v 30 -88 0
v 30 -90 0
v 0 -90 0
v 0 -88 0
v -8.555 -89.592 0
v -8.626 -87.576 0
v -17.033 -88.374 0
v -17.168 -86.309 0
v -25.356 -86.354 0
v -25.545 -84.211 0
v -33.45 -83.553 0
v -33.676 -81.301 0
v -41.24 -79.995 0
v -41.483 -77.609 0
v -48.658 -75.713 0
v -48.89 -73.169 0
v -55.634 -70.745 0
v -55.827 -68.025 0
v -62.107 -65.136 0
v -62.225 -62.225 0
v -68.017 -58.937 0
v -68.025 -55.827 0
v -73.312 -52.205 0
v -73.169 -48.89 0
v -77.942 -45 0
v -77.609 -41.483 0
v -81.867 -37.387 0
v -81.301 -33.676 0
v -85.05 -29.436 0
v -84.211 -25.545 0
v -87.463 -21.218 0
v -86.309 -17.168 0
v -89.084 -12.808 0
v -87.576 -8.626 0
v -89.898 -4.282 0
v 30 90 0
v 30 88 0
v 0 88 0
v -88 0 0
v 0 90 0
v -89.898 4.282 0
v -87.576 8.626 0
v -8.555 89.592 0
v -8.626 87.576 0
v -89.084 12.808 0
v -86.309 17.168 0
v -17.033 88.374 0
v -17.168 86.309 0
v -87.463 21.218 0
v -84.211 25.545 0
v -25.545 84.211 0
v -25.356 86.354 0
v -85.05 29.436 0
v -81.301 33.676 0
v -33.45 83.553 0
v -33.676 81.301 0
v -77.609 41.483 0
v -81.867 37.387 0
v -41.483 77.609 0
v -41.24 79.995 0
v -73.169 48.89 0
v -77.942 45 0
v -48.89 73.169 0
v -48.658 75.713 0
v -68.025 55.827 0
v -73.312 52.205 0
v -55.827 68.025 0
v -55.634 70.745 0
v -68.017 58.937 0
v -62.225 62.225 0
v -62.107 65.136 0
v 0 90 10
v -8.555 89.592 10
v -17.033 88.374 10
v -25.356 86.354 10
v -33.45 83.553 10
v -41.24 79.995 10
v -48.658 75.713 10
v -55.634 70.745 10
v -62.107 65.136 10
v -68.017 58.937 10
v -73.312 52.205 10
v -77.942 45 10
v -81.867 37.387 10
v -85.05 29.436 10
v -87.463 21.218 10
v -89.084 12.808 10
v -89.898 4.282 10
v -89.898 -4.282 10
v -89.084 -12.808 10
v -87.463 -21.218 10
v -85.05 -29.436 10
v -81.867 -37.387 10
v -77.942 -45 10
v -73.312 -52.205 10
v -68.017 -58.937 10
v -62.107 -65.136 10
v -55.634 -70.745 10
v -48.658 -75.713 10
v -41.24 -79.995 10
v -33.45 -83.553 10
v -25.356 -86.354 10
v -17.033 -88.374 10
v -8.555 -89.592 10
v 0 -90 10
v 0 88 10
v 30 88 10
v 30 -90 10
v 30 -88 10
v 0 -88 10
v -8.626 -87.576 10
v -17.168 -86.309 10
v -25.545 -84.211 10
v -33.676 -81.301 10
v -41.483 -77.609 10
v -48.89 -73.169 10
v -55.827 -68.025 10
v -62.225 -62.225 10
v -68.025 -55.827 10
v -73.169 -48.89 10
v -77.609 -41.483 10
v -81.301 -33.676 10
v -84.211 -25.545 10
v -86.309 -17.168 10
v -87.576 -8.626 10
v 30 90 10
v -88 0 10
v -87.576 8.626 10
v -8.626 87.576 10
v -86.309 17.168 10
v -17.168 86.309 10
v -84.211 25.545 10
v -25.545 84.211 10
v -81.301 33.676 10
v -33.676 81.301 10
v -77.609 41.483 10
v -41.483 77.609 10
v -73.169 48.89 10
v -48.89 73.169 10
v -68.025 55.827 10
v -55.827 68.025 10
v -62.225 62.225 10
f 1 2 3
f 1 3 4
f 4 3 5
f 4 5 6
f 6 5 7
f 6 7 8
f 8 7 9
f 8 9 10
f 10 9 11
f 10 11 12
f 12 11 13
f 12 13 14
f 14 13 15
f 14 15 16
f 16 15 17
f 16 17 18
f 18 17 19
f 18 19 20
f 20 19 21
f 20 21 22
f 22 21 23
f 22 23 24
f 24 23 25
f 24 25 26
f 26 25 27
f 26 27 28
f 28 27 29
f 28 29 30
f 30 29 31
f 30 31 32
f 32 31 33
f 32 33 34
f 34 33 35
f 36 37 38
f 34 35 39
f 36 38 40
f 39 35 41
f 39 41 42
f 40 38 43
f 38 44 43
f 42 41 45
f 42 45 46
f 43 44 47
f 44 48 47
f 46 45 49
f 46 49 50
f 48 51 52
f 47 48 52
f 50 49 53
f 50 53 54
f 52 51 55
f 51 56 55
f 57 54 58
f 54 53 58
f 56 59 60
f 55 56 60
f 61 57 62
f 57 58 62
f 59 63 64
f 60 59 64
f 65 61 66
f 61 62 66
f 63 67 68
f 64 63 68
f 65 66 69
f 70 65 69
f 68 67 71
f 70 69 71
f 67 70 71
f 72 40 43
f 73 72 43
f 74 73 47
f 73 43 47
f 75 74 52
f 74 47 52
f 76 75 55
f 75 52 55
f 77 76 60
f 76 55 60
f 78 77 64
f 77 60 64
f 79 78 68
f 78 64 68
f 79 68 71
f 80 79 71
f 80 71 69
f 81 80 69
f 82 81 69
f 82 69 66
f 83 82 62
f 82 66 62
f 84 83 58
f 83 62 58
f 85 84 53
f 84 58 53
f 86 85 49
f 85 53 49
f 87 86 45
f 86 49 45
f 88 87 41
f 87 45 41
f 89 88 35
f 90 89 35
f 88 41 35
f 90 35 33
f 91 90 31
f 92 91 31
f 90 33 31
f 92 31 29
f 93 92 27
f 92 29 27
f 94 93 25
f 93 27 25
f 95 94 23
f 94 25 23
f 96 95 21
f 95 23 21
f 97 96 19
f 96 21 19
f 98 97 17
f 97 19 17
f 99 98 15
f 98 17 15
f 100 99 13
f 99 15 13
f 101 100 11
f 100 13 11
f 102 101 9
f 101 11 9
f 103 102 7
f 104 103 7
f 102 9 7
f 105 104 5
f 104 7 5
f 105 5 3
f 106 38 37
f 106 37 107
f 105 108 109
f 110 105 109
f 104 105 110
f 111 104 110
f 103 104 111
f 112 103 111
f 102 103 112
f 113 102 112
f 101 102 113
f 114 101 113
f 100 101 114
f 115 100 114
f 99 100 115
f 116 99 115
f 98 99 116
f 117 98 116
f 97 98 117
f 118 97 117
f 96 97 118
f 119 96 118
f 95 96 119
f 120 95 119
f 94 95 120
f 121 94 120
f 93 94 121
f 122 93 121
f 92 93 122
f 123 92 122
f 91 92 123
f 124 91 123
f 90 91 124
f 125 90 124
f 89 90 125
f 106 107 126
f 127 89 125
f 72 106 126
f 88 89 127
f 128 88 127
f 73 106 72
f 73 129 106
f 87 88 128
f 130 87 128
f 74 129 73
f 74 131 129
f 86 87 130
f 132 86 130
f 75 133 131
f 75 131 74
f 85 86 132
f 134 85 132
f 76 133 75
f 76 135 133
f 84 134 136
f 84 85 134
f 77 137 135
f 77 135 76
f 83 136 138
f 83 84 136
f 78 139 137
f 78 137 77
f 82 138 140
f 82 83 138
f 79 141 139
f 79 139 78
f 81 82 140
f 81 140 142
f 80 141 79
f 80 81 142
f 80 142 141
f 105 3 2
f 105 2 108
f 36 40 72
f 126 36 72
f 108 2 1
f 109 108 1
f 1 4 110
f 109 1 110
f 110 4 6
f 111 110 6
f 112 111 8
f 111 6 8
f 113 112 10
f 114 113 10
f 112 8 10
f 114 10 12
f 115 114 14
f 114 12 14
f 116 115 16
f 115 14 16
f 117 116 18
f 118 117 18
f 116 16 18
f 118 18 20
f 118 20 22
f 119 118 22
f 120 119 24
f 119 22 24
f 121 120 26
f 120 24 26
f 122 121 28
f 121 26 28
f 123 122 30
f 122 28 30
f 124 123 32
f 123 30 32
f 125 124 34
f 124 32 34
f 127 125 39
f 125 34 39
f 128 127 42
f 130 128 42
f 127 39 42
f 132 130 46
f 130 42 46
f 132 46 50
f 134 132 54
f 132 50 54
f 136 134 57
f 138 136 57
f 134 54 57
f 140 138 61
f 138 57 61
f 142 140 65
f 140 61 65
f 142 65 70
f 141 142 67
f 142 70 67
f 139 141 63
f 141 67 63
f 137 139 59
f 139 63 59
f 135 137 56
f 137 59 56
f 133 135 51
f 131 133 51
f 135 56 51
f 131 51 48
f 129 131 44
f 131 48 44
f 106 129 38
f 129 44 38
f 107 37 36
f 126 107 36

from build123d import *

# Parameters (mm, degrees)
F1_DEPTH  = 10
F1_FACE_W = 2
F1_FACE_H = 10
F3_DEPTH  = 30
F4_DEPTH  = 30


with BuildPart() as f1:
    # F0 (on Top) → F1 (new body)
    with BuildSketch(Plane.XY):
        with BuildLine():
            Line((0, 88), (0, 90))
            ThreePointArc((0, 90), (-90, 0), (0, -90))
            Line((0, -90), (0, -88))
            ThreePointArc((0, -88), (-88, 0), (0, 88))
        make_face()
    extrude(amount=F1_DEPTH)

    # F1_face (on face) → F3 (join)
    with BuildSketch(Plane(origin=(0, -89, 5), x_dir=(0, 1, 0), z_dir=(1, 0, 0))):
        Rectangle(F1_FACE_W, F1_FACE_H)
    extrude(amount=F3_DEPTH)

    # F1_face (on face) → F4 (join)
    with BuildSketch(Plane(origin=(0, -89, 5), x_dir=(0, 1, 0), z_dir=(1, 0, 0))):
        with Locations((178, 0)):
            Rectangle(F1_FACE_W, F1_FACE_H)
    extrude(amount=F4_DEPTH)


solid = f1.part
